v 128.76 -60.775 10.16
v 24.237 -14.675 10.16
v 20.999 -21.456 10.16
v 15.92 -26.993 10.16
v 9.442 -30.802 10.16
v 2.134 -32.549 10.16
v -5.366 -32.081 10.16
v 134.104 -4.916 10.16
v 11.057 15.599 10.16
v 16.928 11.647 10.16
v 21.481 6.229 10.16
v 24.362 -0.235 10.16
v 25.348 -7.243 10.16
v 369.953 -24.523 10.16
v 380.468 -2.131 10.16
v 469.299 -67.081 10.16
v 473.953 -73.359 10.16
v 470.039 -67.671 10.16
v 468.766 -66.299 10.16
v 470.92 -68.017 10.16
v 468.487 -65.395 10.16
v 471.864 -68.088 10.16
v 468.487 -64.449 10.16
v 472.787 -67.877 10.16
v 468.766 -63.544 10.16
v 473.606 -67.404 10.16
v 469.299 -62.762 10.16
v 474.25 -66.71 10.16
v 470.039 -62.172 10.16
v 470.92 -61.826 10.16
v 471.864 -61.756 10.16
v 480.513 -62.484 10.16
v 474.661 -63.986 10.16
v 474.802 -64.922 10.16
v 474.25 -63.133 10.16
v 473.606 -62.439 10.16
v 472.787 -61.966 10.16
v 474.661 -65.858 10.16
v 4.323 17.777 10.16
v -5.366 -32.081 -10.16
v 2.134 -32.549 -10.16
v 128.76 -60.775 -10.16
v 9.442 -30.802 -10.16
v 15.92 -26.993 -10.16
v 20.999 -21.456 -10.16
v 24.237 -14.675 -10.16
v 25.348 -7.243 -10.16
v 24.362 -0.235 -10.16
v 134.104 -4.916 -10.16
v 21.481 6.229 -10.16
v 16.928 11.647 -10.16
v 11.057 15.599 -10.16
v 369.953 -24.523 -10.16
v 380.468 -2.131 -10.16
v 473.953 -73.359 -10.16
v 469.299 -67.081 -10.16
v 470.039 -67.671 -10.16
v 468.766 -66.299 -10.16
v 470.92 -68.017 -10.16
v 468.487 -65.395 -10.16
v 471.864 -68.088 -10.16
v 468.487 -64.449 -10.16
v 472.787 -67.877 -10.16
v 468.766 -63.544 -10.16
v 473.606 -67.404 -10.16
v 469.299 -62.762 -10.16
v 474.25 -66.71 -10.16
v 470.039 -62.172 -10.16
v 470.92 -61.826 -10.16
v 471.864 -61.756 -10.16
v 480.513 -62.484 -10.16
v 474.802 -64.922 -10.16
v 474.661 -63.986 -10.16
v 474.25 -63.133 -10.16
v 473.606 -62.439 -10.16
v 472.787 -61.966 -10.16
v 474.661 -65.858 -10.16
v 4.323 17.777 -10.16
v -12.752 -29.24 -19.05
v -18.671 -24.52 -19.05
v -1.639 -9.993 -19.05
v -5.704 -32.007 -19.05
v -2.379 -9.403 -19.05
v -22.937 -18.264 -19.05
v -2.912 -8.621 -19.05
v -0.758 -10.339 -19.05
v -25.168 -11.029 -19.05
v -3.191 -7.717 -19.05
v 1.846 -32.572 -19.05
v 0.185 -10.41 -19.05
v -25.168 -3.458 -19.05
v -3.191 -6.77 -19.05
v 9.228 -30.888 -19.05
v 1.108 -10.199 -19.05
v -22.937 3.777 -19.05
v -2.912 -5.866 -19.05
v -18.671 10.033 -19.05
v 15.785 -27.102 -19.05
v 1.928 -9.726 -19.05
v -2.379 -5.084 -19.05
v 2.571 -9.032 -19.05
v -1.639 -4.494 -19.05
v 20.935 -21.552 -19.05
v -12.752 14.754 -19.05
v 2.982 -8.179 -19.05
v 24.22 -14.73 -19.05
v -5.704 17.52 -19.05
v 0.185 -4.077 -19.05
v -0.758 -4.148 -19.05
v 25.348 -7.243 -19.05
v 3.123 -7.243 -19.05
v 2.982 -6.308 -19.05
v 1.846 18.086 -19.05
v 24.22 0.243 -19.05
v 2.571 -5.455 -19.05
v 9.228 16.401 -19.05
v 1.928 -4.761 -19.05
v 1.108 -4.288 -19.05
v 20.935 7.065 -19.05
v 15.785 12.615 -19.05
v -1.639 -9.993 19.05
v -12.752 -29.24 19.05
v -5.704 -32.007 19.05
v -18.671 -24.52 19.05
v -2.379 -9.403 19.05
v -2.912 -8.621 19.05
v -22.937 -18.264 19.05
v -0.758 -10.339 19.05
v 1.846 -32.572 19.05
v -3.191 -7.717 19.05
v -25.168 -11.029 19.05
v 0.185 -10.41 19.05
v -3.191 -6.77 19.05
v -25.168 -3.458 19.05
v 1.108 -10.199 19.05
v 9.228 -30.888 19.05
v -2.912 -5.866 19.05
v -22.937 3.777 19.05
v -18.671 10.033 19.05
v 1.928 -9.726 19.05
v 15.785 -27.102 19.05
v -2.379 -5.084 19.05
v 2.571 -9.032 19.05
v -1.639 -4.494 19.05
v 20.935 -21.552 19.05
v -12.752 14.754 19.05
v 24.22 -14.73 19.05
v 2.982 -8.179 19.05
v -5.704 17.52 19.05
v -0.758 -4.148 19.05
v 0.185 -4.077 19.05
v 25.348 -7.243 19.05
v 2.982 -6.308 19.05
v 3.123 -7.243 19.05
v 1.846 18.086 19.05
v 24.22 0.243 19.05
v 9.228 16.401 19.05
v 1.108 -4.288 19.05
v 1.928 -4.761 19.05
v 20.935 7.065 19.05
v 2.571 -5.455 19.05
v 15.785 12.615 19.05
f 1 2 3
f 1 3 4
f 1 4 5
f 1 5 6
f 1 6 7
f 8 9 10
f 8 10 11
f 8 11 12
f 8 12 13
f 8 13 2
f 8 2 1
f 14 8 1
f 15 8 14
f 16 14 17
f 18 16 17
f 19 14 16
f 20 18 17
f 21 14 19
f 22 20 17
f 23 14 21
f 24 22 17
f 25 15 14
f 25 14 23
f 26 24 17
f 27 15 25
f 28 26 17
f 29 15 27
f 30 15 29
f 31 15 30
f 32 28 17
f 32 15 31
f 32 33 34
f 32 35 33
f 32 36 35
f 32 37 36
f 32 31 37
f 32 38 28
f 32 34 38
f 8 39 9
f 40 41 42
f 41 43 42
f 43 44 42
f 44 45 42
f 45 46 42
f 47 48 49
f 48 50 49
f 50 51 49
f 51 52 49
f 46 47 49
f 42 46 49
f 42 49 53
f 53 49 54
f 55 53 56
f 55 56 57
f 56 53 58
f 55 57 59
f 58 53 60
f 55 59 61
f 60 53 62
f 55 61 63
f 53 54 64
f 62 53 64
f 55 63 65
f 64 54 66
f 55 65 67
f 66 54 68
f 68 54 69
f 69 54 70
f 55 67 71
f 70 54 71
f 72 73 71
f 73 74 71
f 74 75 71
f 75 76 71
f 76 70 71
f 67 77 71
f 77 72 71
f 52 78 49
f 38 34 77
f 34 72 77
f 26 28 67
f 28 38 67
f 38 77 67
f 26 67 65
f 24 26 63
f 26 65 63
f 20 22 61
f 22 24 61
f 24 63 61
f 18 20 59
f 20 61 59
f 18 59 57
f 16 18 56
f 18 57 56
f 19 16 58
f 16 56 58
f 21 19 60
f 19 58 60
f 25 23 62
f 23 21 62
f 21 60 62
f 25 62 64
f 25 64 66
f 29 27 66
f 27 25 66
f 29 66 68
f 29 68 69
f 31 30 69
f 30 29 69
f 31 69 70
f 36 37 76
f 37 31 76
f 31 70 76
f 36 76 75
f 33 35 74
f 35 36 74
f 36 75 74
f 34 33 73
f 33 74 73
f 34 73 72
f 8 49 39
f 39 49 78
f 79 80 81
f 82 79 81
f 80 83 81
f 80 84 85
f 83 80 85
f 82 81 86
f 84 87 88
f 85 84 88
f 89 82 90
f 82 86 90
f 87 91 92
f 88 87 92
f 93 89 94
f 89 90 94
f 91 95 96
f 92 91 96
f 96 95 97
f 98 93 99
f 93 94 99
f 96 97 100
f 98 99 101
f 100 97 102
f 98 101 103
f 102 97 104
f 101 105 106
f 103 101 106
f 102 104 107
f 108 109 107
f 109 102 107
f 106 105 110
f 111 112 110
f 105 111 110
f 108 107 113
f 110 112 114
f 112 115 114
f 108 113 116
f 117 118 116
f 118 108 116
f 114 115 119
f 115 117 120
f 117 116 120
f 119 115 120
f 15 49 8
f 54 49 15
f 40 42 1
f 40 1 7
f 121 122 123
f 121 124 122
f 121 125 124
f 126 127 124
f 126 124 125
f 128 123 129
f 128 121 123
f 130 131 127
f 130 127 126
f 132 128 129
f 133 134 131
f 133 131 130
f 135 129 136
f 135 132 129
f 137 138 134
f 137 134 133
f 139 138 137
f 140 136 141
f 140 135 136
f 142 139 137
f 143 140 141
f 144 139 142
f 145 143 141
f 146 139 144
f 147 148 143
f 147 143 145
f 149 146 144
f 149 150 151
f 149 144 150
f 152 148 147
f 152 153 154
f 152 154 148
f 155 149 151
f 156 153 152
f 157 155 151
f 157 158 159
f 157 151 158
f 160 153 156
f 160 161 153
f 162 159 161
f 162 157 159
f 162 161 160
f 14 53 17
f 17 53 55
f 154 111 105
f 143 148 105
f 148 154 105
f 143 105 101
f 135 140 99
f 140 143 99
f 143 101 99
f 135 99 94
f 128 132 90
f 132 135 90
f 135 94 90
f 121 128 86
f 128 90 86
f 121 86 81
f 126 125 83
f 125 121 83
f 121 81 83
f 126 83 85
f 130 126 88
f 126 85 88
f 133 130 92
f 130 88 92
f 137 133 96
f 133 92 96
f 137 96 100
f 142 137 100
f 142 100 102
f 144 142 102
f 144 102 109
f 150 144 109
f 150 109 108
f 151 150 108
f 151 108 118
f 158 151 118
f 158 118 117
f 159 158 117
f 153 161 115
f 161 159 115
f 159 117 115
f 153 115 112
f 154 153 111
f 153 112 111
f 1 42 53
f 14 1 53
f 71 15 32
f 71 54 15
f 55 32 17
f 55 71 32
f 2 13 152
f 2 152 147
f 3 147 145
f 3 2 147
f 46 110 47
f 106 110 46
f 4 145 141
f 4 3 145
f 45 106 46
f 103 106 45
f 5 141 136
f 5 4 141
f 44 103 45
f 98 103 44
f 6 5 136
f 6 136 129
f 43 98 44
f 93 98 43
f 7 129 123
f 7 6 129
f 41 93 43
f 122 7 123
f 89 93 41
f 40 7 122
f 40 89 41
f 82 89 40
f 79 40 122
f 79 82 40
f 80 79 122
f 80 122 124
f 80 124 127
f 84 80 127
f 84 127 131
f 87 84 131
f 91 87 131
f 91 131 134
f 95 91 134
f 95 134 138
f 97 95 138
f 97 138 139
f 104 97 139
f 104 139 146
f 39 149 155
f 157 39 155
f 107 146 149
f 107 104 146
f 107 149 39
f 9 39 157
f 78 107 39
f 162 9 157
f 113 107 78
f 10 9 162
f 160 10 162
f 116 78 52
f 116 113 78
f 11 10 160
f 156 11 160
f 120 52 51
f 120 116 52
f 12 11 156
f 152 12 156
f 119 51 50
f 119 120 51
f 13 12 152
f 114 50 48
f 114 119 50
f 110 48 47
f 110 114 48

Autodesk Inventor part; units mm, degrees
ref_plane "YZ Plane" through (0, 0, 0) normal (1, 0, 0) x (0, 1, 0)
ref_plane "XZ Plane" through (0, 0, 0) normal (0, 1, 0) x (-1, 0, 0)
ref_plane "XY Plane" through (0, 0, 0) normal (0, 0, 1) x (1, 0, 0)
sketch "Sketch1" plane through (0, 0, 0) normal (0, 0, 1) x (1, 0, 0)
  line L0 (131.4017, -33.1581) -> (234.4053, -26.2304) construction
  line L1 (375.2105, -13.3271) -> (477.233, -67.9218) construction
  line L2 (380.4679, -2.1311) -> (480.5131, -62.4845)
  line L3 (480.5131, -62.4845) -> (473.953, -73.359)
  line L4 (369.9531, -24.5231) -> (473.953, -73.359)
  line L5 (380.4679, -2.1311) -> (369.9531, -24.5231) construction
  line L6 (128.7595, -60.7752) -> (134.1036, -4.9164) construction
  line L7 (128.7595, -60.7752) -> (-5.3656, -32.0813)
  circle A0 centre (-0.0519, -7.2434) radius 25.4
  line L8 (134.1036, -4.9164) -> (4.3231, 17.777)
  line L9 (131.4017, -33.1581) -> (-0.0519, -7.2434) construction
  line L10 (265.3565, -22.0515) -> (375.2105, -13.3271) construction
  line L11 (134.1036, -4.9164) -> (380.4679, -2.1311)
  line L12 (128.7595, -60.7752) -> (369.9531, -24.5231)
  circle A1 centre (471.6268, -64.9218) radius 3.175
  circle A2 centre (-0.0519, -7.2434) radius 3.175
  point P0 (0, 0)
  dimension "d4" = 148
  dimension "d5" = 50.8
  dimension "d6" = 24.7379
  dimension "d7" = 165
  dimension "d8" = 4.7
  dimension "d9" = 3.2
  dimension "d10" = 137.16
  dimension "d11" = 246.38
  dimension "d12" = 116.84
  dimension "d13" = 12.7
  dimension "d14" = 6.35
  dimension "d15" = 6.35
  dimension "d16" = 6.35
extrude "Extrusion1" add sketch "Sketch1" along normal mid plane 20.32 contours L2 L3 L4 L12 L7 A0 L8 L11
extrude "Extrusion2" add sketch "Sketch1" along normal mid plane 38.1 contours A0
properties part number "forearm"
